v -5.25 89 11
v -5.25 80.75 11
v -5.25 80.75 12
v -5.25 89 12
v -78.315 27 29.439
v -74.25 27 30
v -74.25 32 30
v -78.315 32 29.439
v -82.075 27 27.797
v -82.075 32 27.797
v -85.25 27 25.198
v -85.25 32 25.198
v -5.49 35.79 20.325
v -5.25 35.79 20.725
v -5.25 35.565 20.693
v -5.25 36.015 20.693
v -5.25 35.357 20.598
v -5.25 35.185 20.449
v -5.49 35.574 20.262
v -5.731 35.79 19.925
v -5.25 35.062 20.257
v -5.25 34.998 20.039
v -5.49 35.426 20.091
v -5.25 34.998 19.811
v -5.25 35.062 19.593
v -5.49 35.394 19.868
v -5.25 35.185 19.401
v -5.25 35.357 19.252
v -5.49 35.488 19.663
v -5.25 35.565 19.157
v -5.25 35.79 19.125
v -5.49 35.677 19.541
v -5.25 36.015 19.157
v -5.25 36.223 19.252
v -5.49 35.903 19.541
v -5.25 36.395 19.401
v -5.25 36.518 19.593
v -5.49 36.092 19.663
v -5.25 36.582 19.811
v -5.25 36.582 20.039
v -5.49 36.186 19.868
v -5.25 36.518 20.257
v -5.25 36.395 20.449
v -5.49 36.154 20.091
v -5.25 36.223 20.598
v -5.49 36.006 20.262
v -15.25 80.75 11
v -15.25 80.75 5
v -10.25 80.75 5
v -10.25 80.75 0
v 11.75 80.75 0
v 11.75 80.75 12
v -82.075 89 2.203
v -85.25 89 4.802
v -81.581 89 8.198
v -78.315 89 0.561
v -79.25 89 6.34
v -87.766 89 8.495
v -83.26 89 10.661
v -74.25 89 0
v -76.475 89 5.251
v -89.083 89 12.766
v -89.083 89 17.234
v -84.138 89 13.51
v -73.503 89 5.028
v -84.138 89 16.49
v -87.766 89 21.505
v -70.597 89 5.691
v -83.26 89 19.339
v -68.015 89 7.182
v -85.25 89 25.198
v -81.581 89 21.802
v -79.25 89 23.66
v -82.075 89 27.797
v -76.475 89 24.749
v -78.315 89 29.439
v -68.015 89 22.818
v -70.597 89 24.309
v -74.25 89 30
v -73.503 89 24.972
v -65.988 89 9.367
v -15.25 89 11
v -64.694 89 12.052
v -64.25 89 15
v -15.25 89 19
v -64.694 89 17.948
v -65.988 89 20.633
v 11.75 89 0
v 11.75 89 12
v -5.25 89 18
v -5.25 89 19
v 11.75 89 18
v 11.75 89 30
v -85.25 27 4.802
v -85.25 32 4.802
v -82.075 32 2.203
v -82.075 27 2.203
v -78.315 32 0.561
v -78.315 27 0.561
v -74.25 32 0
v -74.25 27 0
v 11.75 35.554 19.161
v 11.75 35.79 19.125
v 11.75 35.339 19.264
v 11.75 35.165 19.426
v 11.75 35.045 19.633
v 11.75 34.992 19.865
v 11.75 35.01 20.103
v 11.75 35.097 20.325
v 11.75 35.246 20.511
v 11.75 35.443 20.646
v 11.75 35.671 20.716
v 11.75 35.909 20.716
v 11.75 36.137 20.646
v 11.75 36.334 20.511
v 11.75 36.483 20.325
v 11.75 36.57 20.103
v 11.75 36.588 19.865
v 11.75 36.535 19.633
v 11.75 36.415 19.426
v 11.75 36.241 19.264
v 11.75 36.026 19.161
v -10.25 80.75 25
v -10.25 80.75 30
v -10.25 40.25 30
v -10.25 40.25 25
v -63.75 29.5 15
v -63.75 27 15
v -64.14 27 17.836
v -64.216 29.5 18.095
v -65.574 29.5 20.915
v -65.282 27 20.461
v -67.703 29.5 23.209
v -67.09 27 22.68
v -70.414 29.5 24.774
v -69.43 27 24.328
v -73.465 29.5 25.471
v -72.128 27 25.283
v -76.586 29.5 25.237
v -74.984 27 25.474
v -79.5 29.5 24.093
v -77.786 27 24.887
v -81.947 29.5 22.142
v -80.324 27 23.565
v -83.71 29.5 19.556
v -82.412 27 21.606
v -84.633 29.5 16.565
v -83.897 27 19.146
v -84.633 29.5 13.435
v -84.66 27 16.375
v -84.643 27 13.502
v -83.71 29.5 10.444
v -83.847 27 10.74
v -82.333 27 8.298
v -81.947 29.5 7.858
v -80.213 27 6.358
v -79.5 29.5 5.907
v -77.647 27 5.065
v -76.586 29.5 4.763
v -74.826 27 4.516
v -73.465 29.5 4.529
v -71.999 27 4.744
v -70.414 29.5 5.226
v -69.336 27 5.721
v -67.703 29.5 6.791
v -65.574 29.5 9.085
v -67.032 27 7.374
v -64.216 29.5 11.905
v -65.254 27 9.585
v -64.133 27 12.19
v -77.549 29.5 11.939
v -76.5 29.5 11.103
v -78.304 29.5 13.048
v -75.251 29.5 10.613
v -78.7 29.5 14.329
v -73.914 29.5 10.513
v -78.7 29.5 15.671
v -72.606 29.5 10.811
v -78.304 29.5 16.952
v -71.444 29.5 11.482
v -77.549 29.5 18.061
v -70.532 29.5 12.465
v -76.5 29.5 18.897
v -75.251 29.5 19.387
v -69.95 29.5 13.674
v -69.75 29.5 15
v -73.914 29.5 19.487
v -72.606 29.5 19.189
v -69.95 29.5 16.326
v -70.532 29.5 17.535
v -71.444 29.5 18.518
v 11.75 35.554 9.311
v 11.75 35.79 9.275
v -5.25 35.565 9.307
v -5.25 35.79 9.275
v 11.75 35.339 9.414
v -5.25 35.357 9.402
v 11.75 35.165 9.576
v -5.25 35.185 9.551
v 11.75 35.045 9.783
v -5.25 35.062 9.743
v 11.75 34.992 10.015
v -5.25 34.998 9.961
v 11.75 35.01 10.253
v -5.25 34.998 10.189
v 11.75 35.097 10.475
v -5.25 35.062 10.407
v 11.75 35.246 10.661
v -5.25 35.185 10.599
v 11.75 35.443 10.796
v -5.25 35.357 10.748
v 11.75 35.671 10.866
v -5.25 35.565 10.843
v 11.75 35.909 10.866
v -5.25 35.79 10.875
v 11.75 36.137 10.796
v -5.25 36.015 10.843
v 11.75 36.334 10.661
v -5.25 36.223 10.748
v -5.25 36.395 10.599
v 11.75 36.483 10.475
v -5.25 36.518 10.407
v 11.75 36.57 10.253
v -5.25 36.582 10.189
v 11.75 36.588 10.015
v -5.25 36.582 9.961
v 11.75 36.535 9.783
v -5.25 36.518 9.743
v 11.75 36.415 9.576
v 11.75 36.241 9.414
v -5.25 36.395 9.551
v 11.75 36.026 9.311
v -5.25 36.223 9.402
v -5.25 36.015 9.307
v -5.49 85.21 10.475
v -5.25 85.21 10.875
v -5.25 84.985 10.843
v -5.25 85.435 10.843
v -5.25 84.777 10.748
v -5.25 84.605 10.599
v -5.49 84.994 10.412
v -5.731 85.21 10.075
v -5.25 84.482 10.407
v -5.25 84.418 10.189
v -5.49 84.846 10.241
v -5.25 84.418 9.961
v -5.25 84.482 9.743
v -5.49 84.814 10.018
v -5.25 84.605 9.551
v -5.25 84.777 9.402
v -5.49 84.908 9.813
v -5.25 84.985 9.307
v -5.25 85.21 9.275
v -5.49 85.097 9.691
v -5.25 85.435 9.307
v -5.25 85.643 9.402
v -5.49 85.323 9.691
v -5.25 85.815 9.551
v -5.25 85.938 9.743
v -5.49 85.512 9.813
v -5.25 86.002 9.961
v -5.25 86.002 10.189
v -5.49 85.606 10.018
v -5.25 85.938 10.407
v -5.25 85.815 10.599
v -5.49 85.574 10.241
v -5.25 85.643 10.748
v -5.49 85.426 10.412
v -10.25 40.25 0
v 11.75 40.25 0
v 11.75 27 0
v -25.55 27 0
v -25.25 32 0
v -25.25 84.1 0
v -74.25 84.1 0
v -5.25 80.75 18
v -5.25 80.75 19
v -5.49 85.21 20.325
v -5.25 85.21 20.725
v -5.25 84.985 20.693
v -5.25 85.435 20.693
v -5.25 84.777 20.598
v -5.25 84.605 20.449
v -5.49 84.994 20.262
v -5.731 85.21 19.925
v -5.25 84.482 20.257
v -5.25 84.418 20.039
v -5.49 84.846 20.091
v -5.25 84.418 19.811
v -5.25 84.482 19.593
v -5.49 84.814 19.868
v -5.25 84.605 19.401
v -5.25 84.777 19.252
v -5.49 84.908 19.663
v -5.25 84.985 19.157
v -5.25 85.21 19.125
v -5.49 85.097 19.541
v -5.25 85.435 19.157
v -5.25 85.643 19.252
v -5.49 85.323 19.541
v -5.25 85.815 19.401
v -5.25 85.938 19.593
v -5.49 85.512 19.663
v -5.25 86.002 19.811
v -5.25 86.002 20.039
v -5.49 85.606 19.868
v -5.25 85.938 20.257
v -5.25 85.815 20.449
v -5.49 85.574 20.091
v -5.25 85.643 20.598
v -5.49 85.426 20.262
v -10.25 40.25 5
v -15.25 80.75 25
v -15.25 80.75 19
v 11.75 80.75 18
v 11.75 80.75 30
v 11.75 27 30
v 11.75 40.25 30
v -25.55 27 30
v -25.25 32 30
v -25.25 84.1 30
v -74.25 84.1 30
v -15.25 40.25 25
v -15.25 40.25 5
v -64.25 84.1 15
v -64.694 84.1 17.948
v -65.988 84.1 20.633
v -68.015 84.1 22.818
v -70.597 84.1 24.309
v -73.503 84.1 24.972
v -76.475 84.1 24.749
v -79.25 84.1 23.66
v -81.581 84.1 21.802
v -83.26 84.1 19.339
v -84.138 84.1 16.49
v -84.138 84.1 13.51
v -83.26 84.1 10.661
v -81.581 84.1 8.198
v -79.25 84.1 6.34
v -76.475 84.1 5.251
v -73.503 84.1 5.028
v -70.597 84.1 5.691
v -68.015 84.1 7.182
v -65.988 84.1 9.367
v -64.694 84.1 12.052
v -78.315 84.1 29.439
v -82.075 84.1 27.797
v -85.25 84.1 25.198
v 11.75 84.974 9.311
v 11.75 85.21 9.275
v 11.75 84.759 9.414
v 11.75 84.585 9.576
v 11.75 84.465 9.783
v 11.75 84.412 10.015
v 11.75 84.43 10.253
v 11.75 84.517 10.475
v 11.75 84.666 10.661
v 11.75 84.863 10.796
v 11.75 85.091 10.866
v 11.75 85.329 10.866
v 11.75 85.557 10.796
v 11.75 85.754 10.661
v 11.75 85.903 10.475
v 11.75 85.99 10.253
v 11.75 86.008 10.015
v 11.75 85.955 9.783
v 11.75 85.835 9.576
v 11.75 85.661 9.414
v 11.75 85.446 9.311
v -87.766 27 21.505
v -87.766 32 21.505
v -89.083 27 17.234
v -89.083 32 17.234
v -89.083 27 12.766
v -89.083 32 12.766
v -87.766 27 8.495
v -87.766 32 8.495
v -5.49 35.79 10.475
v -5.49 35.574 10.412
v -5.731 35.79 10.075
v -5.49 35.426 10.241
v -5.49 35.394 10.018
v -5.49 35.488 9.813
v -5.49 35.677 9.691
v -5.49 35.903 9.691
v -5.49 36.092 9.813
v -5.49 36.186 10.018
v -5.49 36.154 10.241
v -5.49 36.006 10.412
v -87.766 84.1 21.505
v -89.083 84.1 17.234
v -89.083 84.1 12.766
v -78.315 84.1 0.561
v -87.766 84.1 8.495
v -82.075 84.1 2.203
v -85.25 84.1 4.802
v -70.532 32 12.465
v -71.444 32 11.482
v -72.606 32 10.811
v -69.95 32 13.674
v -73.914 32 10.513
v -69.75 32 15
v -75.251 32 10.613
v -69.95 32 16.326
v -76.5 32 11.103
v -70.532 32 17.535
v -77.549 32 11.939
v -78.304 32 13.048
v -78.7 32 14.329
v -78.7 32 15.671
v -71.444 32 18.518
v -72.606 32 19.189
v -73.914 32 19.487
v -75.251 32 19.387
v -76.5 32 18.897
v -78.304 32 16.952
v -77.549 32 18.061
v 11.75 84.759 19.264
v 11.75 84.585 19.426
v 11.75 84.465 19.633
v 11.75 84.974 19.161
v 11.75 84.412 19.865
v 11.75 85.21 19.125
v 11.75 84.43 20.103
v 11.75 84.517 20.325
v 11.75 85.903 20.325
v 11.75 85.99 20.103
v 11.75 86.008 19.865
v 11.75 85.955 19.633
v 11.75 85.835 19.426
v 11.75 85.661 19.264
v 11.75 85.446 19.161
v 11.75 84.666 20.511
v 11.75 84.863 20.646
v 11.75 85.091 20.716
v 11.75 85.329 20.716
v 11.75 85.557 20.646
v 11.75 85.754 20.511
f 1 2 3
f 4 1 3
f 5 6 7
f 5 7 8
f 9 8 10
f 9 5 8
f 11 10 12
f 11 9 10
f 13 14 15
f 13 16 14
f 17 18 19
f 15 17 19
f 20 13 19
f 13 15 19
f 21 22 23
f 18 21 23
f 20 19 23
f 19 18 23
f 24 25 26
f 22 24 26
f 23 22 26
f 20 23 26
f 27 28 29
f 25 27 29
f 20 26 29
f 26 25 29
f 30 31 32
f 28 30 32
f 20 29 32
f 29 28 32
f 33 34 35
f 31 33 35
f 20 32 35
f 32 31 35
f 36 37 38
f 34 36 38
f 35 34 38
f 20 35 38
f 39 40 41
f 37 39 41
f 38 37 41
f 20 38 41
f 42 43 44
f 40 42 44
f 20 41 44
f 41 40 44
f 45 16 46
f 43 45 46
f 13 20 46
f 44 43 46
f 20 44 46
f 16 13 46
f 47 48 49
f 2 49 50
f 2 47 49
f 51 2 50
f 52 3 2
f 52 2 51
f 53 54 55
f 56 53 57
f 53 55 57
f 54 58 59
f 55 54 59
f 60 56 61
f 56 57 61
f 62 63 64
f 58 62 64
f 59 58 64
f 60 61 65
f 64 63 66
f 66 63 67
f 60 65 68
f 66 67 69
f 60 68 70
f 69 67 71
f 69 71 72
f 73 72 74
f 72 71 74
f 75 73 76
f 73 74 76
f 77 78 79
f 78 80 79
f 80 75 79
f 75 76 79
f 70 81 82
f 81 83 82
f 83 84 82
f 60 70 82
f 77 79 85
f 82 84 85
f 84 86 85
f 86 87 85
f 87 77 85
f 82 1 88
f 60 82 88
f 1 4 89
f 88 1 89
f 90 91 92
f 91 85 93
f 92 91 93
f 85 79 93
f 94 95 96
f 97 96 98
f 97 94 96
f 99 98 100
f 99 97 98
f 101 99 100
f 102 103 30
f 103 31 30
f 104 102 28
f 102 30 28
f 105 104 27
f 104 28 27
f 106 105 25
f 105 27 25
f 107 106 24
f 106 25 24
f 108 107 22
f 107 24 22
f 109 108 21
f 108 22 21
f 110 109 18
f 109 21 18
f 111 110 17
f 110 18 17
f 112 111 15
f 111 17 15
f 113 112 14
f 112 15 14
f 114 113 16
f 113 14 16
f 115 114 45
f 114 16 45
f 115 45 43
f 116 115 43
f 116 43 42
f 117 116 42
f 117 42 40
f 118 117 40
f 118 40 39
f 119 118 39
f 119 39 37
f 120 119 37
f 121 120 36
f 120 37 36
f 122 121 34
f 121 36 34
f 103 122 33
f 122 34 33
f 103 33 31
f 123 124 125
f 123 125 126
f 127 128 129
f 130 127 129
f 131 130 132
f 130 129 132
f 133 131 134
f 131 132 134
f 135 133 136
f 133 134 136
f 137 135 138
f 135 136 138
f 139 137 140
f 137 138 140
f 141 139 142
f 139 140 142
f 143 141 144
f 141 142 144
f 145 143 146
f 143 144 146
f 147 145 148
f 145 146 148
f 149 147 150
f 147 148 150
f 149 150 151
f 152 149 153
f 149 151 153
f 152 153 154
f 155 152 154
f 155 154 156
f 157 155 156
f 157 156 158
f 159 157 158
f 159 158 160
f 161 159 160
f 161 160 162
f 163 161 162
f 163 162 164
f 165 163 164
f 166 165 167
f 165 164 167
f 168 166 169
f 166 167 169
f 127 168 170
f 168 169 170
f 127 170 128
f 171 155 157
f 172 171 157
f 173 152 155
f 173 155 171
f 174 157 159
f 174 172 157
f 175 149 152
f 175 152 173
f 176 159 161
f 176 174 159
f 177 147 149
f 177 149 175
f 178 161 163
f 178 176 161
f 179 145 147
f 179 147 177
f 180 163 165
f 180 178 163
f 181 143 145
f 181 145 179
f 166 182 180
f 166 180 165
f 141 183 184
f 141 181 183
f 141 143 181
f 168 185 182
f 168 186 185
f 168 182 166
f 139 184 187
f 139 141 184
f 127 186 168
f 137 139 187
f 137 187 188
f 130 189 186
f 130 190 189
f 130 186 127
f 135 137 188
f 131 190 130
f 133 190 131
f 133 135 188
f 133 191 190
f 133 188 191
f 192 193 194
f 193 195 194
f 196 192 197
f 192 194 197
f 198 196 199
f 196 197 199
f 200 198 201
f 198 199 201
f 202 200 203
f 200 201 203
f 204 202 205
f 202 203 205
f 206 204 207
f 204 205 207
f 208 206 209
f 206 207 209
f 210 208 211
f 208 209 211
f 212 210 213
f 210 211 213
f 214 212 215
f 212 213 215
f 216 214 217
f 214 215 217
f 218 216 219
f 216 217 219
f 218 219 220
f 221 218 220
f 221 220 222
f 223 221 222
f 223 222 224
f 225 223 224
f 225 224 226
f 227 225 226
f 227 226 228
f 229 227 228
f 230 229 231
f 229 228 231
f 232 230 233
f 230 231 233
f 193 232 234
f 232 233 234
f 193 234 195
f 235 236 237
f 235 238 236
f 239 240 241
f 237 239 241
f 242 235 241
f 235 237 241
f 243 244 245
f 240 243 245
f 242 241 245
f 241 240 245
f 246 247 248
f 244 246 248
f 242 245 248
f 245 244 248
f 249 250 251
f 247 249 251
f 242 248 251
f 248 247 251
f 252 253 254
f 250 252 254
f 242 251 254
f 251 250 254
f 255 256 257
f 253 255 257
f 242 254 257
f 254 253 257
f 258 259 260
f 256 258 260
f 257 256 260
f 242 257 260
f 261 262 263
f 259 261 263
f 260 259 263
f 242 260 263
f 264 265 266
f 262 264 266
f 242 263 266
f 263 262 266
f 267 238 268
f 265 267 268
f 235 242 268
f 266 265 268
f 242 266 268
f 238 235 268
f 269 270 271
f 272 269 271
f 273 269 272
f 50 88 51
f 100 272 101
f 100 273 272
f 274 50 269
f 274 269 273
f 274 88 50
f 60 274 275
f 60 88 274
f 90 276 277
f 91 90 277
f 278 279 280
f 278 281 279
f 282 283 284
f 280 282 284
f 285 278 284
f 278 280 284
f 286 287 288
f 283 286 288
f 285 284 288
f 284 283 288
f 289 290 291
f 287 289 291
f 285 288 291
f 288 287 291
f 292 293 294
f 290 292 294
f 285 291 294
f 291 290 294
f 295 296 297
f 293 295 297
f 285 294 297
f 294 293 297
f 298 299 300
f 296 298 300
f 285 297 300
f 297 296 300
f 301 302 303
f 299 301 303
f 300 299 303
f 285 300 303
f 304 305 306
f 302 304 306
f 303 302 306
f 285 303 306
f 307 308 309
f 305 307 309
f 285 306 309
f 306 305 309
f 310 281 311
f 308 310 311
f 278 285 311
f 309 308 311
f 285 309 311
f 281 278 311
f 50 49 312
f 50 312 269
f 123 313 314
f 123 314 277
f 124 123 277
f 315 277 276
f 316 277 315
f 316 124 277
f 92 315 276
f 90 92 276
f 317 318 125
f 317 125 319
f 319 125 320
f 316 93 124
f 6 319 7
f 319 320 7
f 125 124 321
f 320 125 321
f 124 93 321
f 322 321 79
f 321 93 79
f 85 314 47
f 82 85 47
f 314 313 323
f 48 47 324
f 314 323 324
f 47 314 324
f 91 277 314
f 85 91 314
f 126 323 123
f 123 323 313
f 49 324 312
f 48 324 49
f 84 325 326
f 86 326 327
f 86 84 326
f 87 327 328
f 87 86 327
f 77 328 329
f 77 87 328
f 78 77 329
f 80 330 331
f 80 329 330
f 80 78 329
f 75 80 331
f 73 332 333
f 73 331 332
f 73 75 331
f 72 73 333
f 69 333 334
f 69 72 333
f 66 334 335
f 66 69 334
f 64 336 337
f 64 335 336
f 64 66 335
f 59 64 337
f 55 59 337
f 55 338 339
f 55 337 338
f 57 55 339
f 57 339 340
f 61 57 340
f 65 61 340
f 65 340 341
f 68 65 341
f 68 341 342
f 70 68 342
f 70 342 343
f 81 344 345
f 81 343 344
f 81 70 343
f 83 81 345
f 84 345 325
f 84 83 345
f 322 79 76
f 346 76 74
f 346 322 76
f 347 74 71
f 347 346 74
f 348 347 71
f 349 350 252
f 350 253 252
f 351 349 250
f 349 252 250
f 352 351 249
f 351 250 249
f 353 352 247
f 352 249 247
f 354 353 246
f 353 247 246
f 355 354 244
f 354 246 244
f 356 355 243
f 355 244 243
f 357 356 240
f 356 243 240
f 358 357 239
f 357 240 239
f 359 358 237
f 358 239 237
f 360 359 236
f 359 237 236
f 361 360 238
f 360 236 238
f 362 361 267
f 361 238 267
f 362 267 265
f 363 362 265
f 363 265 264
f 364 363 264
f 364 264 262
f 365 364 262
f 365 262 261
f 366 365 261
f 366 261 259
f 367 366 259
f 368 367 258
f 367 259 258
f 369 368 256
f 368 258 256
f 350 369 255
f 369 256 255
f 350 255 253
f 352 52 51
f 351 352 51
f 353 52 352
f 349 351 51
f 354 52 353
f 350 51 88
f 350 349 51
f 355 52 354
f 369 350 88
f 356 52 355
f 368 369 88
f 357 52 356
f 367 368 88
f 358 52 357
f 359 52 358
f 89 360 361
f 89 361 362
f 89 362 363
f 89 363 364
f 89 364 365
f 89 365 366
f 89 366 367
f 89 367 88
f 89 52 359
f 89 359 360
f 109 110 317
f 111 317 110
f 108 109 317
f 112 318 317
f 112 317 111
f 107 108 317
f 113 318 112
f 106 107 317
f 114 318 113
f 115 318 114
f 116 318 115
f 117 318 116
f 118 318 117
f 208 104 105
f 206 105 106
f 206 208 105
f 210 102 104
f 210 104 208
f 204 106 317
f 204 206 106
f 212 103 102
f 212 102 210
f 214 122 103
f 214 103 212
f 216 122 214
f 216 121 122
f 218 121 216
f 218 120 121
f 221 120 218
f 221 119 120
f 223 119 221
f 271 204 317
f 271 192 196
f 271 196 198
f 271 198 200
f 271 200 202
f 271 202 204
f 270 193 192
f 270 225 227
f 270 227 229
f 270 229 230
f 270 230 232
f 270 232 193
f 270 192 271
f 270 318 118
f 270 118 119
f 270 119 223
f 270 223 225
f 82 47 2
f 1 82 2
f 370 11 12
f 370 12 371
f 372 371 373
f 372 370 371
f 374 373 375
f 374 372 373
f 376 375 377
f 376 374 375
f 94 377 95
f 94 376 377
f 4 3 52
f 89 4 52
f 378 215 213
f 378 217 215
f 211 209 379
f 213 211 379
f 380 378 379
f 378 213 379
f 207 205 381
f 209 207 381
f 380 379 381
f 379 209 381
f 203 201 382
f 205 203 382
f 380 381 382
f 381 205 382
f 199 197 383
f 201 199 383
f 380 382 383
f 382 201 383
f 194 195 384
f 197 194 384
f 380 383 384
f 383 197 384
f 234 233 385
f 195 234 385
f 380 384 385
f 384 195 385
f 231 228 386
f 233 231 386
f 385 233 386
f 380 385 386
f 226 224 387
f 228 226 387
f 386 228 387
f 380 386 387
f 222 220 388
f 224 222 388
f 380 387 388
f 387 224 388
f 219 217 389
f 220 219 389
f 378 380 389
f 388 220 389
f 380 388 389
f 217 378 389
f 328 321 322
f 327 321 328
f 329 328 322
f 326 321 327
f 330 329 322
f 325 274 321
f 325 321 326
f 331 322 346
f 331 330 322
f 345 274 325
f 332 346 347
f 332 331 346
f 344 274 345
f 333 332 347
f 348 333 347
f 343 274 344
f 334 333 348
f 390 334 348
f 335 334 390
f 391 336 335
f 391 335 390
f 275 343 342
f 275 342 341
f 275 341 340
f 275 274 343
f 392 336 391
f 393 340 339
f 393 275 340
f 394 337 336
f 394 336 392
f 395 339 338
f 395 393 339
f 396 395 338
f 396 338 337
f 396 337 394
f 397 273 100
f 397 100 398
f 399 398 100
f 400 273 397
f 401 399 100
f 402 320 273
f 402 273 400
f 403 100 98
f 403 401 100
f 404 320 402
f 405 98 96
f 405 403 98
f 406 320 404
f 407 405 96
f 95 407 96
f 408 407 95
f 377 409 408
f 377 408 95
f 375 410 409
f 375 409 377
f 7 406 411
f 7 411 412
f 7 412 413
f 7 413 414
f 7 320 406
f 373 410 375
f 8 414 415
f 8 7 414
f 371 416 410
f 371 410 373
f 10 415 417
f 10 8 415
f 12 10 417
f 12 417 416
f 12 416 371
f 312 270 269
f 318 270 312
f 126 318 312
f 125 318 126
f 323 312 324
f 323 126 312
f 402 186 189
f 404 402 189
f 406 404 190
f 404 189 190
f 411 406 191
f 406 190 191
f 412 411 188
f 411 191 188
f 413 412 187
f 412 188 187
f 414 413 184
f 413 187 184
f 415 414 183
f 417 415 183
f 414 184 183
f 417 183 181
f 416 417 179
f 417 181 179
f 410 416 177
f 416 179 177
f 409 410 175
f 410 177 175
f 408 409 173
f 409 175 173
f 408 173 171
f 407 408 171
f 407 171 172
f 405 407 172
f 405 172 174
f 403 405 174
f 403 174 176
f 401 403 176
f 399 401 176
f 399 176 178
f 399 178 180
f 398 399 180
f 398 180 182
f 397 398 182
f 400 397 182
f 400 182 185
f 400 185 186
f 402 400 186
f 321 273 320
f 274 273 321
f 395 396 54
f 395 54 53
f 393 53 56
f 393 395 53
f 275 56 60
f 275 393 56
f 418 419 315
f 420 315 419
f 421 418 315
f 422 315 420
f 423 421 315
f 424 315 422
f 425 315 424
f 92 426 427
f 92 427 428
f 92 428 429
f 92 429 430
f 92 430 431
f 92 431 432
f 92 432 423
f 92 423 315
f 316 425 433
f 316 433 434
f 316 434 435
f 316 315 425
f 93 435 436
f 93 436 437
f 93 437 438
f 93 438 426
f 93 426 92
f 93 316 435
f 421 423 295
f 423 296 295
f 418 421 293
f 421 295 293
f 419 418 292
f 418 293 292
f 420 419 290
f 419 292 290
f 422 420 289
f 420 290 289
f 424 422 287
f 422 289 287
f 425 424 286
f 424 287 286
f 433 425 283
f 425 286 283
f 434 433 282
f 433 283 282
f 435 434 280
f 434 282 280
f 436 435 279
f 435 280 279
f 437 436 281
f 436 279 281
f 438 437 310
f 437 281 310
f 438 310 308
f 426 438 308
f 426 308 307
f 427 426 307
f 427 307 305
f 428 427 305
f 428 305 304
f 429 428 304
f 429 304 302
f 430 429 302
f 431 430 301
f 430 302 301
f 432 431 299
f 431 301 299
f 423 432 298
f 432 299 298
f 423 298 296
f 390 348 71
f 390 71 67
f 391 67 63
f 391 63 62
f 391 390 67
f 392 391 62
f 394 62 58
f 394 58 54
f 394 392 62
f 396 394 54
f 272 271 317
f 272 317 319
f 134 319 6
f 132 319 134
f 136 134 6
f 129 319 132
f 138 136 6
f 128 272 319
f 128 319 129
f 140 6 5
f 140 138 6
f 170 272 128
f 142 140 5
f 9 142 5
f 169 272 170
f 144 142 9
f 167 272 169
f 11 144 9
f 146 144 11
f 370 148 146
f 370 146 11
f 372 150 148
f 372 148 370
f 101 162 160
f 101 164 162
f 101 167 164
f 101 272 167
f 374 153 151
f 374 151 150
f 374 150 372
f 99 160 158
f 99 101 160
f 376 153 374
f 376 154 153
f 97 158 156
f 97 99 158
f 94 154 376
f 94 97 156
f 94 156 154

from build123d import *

# Parameters (mm, degrees)
ESQUISSE1_W               = 60.5
ESQUISSE1_H               = 64
BOSS_EXTRU_1_DEPTH        = 30
ESQUISSE2_R               = 4.5
ENL_V_MAT_EXTRU_1_DEPTH   = 32
ENL_V_MAT_EXTRU_2_REACH   = 55.283
ESQUISSE4_W               = 51.1
ESQUISSE4_H               = 83.557669167
ESQUISSE5_R               = 10.5
ENL_V_MAT_EXTRU_3_DEPTH   = 2
ESQUISSE6_R               = 10
ENL_V_MAT_EXTRU_4_DEPTH   = 4.7
ESQUISSE7_W               = 47
ESQUISSE7_H               = 57
BOSS_EXTRU_2_DEPTH        = 30
ENL_V_MAT_EXTRU_5_DEPTH   = 30
ENL_V_MAT_EXTRU_6_DEPTH   = 8.25
ESQUISSE11_W              = 5
ESQUISSE11_H              = 40.5
BOSS_EXTRU_3_DEPTH        = 5
ESQUISSE12_R              = 0.5
ENL_V_MAT_EXTRU_7_DEPTH   = 15
TROU_TARAUD_M2X0_42_D     = 1.6
TROU_TARAUD_M2X0_42_DEPTH = 17
TROU_TARAUD_M2X0_42_TIP   = 0.480688495
ENL_V_MAT_EXTRU_8_REACH   = 113.72
ESQUISSE22_W              = 82.97203866
ESQUISSE22_H              = 67.875780224
ENL_V_MAT_EXTRU_10_DEPTH  = 30
ESQUISSE23_W              = 55
ESQUISSE23_H              = 5
ESQUISSE23_H_2            = 4.9
BOSS_EXTRU_4_DEPTH        = 30
ENL_V_START               = -62
ESQUISSE24_R              = 10
ENL_V_MAT_EXTRU_11_DEPTH  = 62
ENL_V_MAT_EXTRU_12_REACH  = 111.597
ESQUISSE26_R              = 10.5
ESQUISSE26_R_2            = 4.5
BOSS_EXTRU_5_DEPTH        = 5
ESQUISSE27_R              = 10.5
ENL_V_MAT_EXTRU_13_DEPTH  = 2.5
ESQUISSE28_W              = 21.53784572
ESQUISSE28_H              = 33.22443827
ENL_V_MAT_EXTRU_14_DEPTH  = 5
ESQUISSE29_W              = 5
ESQUISSE29_H              = 52.1
ENL_V_MAT_EXTRU_15_DEPTH  = 30
BOSS_EXTRU_6_DEPTH        = 62
ENL_V_START_2             = -20.388398
ESQUISSE32_W              = 38.789198293
ESQUISSE32_H              = 52.1
ENL_V_MAT_EXTRU_16_DEPTH  = 20.388398


with BuildPart() as part:
    # Esquisse1 → Boss.-Extru.1 (new body)
    with BuildSketch(Plane.XY):
        Rectangle(ESQUISSE1_W, ESQUISSE1_H)
    extrude(amount=BOSS_EXTRU_1_DEPTH)

    # Esquisse2 → Enlèv. mat.-Extru.1 (cut)
    with BuildSketch(Plane(origin=(30.25, 0, 0), x_dir=(0, 0, -1), z_dir=(1, 0, 0))):
        with Locations(Location((-15, -17, 0), (0, 0, 90))):
            Circle(ESQUISSE2_R)
    extrude(amount=-ENL_V_MAT_EXTRU_1_DEPTH, mode=Mode.SUBTRACT)

    # Enlèv. mat.-Extru.2: up to this face of the body (flat: up to its plane)
    enl_v_mat_extru_2_end = Plane(part.part.faces().sort_by_distance((0, 0, 0))[0])
    # Esquisse4 → Enlèv. mat.-Extru.2 (cut, up to the picked face)
    with BuildSketch(Plane.XY.offset(30), mode=Mode.PRIVATE) as enl_v_mat_extru_2_sk1:
        with Locations((0, -14.778834584)):
            Rectangle(ESQUISSE4_W, ESQUISSE4_H)
    enl_v_mat_extru_2_tool1 = split(extrude(enl_v_mat_extru_2_sk1.sketch, amount=-ENL_V_MAT_EXTRU_2_REACH, mode=Mode.PRIVATE), bisect_by=enl_v_mat_extru_2_end, keep=Keep.BOTH, mode=Mode.PRIVATE)
    add(enl_v_mat_extru_2_tool1.solids().sort_by(Axis((0, -14.778835, 30), (0, 0, -1)))[0], mode=Mode.SUBTRACT)

    # Esquisse5 → Enlèv. mat.-Extru.3 (cut)
    with BuildSketch(Plane(origin=(30.25, 0, 0), x_dir=(0, 0, -1), z_dir=(1, 0, 0))):
        with Locations(Location((-15, -17, 0), (0, 0, 90))):
            Circle(ESQUISSE5_R)
    extrude(amount=-ENL_V_MAT_EXTRU_3_DEPTH, mode=Mode.SUBTRACT)

    # Esquisse6 → Enlèv. mat.-Extru.4 (cut)
    with BuildSketch(Plane(origin=(-25.55, 0, 0), x_dir=(0, 0, -1), z_dir=(1, 0, 0))):
        with Locations((-15, -17)):
            Circle(ESQUISSE6_R)
    extrude(amount=-ENL_V_MAT_EXTRU_4_DEPTH, mode=Mode.SUBTRACT)

    # Esquisse7 → Boss.-Extru.2 (add)
    with BuildSketch(Plane.XY.offset(30)):
        with Locations((-6.75, 60.5)):
            Rectangle(ESQUISSE7_W, ESQUISSE7_H)
    extrude(amount=-BOSS_EXTRU_2_DEPTH)

    # Esquisse8 → Enlèv. mat.-Extru.5 (cut)
    with BuildSketch(Plane.XY.offset(30)):
        Polygon((-15.25, 80.75), (11.75, 80.75), (11.75, 101.149817475), (21.75, 101.149817475), (21.75, 32), (11.75, 32), (11.75, 40.25), (-15.25, 40.25), align=None)
    extrude(amount=-ENL_V_MAT_EXTRU_5_DEPTH, mode=Mode.SUBTRACT)

    # Esquisse10 → Enlèv. mat.-Extru.6 (cut)
    with BuildSketch(Plane.XZ.offset(-80.75)):
        Polygon((-5.25, 11), (-5.25, 12), (34.75, 12), (34.75, 18), (-5.25, 18), (-5.25, 19), (-15.25, 19), (-15.25, 11), align=None)
    extrude(amount=-ENL_V_MAT_EXTRU_6_DEPTH, mode=Mode.SUBTRACT)

    # Esquisse11 → Boss.-Extru.3 (add)
    with BuildSketch(Plane(origin=(-15.25, 0, 0), x_dir=(0, 0, -1), z_dir=(1, 0, 0))):
        with Locations((-27.5, 60.5)):
            Rectangle(ESQUISSE11_W, ESQUISSE11_H)
        with Locations((-2.5, 60.5)):
            Rectangle(ESQUISSE11_W, ESQUISSE11_H)
    extrude(amount=BOSS_EXTRU_3_DEPTH)

    # Esquisse12 → Enlèv. mat.-Extru.7 (cut)
    with BuildSketch(Plane(origin=(11.75, 0, 0), x_dir=(0, 0, -1), z_dir=(1, 0, 0))):
        with Locations((-19.925, 85.21)):
            Circle(ESQUISSE12_R)
        with Locations(Location((-10.075, 85.21, 0), (0, 0, 180))):
            Circle(ESQUISSE12_R)
        with Locations((-10.075, 35.79)):
            Circle(ESQUISSE12_R)
        with Locations(Location((-19.925, 35.79, 0), (0, 0, 180))):
            Circle(ESQUISSE12_R)
    extrude(amount=-ENL_V_MAT_EXTRU_7_DEPTH, mode=Mode.SUBTRACT)

    # Trou taraudé M2x0.42
    with Locations(Plane(origin=(11.75, 85.21, 19.925), x_dir=(0, 0, 1), z_dir=(1, 0, 0))):
        with Locations((0, 0), (-9.85, 0), (-9.85, 49.42), (0, 49.42)):
            Hole(TROU_TARAUD_M2X0_42_D / 2, depth=TROU_TARAUD_M2X0_42_DEPTH)
            with Locations((0, 0, -(TROU_TARAUD_M2X0_42_DEPTH + TROU_TARAUD_M2X0_42_TIP / 2))):  # 118° drill point
                Cone(0, TROU_TARAUD_M2X0_42_D / 2, TROU_TARAUD_M2X0_42_TIP, mode=Mode.SUBTRACT)

    # Enlèv. mat.-Extru.8: up to this face of the body (flat: up to its plane)
    enl_v_mat_extru_8_end = Plane(part.part.faces().sort_by_distance((30.25, 3.741727612, 15))[0])
    # Esquisse15 → Enlèv. mat.-Extru.8 (cut, up to the picked face)
    with BuildSketch(Plane.ZY.offset(30.25), mode=Mode.PRIVATE) as enl_v_mat_extru_8_sk1:
        with BuildLine():
            Line((40, -17), (30, -17))
            ThreePointArc((30, -17), (15, -32), (0, -17))
            Line((0, -17), (-10, -17))
            ThreePointArc((-10, -17), (15, -42), (40, -17))
        make_face()
    enl_v_mat_extru_8_tool1 = split(extrude(enl_v_mat_extru_8_sk1.sketch, amount=-ENL_V_MAT_EXTRU_8_REACH, mode=Mode.PRIVATE), bisect_by=enl_v_mat_extru_8_end, keep=Keep.BOTH, mode=Mode.PRIVATE)
    add(enl_v_mat_extru_8_tool1.solids().sort_by(Axis((-30.25, -17.559017, -5), (1, 0, 0)))[0], mode=Mode.SUBTRACT)

    # Esquisse22 → Enlèv. mat.-Extru.10 (cut)
    with BuildSketch(Plane.XY.offset(30)):
        with Locations((-1.917421061, -6.937890112)):
            Rectangle(ESQUISSE22_W, ESQUISSE22_H)
    extrude(amount=-ENL_V_MAT_EXTRU_10_DEPTH, mode=Mode.SUBTRACT)

    # Esquisse23 → Boss.-Extru.4 (add)
    with BuildSketch(Plane(origin=(0, 0, 0), x_dir=(-1, 0, 0), z_dir=(0, 0, -1))):
        with Locations((57.75, 29.5)):
            Rectangle(ESQUISSE23_W, ESQUISSE23_H)
        with Locations((57.75, 86.55)):
            Rectangle(ESQUISSE23_W, ESQUISSE23_H_2)
    extrude(amount=-BOSS_EXTRU_4_DEPTH)

    # Esquisse24 → Enlèv. mat.-Extru.11 (cut)
    with BuildSketch(Plane.XZ.offset(-27).offset(ENL_V_START)):
        with Locations((-74.25, 15)):
            Circle(ESQUISSE24_R)
    extrude(amount=ENL_V_MAT_EXTRU_11_DEPTH, mode=Mode.SUBTRACT)

    # Enlèv. mat.-Extru.12: up to this face of the body (flat: up to its plane)
    enl_v_mat_extru_12_end = Plane(part.part.faces().sort_by_distance((-34.437928466, 89, 15))[0])
    # Esquisse25 → Enlèv. mat.-Extru.12 (cut, up to the picked face)
    with BuildSketch(Plane.XZ.offset(-27), mode=Mode.PRIVATE) as enl_v_mat_extru_12_sk1:
        with BuildLine():
            Line((-74.25, 44.134833893), (-74.25, 30))
            ThreePointArc((-74.25, 30), (-89.25, 15), (-74.25, 0))
            Line((-74.25, 0), (-74.25, -14.134833893))
            ThreePointArc((-74.25, -14.134833893), (-103.384833893, 15), (-74.25, 44.134833893))
        make_face()
    enl_v_mat_extru_12_tool1 = split(extrude(enl_v_mat_extru_12_sk1.sketch, amount=-ENL_V_MAT_EXTRU_12_REACH, mode=Mode.PRIVATE), bisect_by=enl_v_mat_extru_12_end, keep=Keep.BOTH, mode=Mode.PRIVATE)
    add(enl_v_mat_extru_12_tool1.solids().sort_by(Axis((-74.901475, 27, 37.067417), (0, 1, 0)))[0], mode=Mode.SUBTRACT)

    # Esquisse26 → Boss.-Extru.5 (add)
    with BuildSketch(Plane.XZ.offset(-27)):
        with Locations((-74.25, 15)):
            Circle(ESQUISSE26_R)
        with Locations((-74.25, 15)):
            Circle(ESQUISSE26_R_2, mode=Mode.SUBTRACT)
    extrude(amount=-BOSS_EXTRU_5_DEPTH)

    # Esquisse27 → Enlèv. mat.-Extru.13 (cut)
    with BuildSketch(Plane.XZ.offset(-27)):
        with Locations((-74.25, 15)):
            Circle(ESQUISSE27_R)
    extrude(amount=-ENL_V_MAT_EXTRU_13_DEPTH, mode=Mode.SUBTRACT)

    # Esquisse28 → Enlèv. mat.-Extru.14 (cut)
    with BuildSketch(Plane(origin=(0, 32, 0), x_dir=(1, 0, 0), z_dir=(0, 1, 0))):
        with Locations((22.51892286, -16.612219135)):
            Rectangle(ESQUISSE28_W, ESQUISSE28_H)
    extrude(amount=-ENL_V_MAT_EXTRU_14_DEPTH, mode=Mode.SUBTRACT)

    # Esquisse29 → Enlèv. mat.-Extru.15 (cut)
    with BuildSketch(Plane(origin=(0, 0, 0), x_dir=(-1, 0, 0), z_dir=(0, 0, -1))):
        with Locations((27.75, 58.05)):
            Rectangle(ESQUISSE29_W, ESQUISSE29_H)
    extrude(amount=-ENL_V_MAT_EXTRU_15_DEPTH, mode=Mode.SUBTRACT)

    # Esquisse31 → Boss.-Extru.6 (add)
    with BuildSketch(Plane.XZ.offset(-27)):
        with BuildLine():
            ThreePointArc((-74.826036871, 4.515812787), (-83.84709586, 10.740217019), (-82.411654216, 21.605861069))
            Line((-82.411654216, 21.605861069), (-85.25, 25.198039027))
            Line((-85.25, 25.198039027), (-85.25, 4.801960973))
            Line((-85.25, 4.801960973), (-74.826036871, 4.515812787))
        make_face()
        with BuildLine():
            ThreePointArc((-85.25, 25.198039027), (-89.25, 15), (-85.25, 4.801960973))
            Line((-85.25, 4.801960973), (-85.25, 25.198039027))
        make_face()
    extrude(amount=-BOSS_EXTRU_6_DEPTH)

    # Esquisse32 → Enlèv. mat.-Extru.16 (cut)
    with BuildSketch(Plane(origin=(0.067526976, 0, 2.459909751), x_dir=(-0.9996234341769173, 0, 0.027440660421105302), z_dir=(-0.027440660421105302, 0, -0.9996234341769173)).offset(ENL_V_START_2)):
        with Locations((94.316375975, 58.05)):
            Rectangle(ESQUISSE32_W, ESQUISSE32_H)
    extrude(amount=ENL_V_MAT_EXTRU_16_DEPTH, mode=Mode.SUBTRACT)


solid = part.part
